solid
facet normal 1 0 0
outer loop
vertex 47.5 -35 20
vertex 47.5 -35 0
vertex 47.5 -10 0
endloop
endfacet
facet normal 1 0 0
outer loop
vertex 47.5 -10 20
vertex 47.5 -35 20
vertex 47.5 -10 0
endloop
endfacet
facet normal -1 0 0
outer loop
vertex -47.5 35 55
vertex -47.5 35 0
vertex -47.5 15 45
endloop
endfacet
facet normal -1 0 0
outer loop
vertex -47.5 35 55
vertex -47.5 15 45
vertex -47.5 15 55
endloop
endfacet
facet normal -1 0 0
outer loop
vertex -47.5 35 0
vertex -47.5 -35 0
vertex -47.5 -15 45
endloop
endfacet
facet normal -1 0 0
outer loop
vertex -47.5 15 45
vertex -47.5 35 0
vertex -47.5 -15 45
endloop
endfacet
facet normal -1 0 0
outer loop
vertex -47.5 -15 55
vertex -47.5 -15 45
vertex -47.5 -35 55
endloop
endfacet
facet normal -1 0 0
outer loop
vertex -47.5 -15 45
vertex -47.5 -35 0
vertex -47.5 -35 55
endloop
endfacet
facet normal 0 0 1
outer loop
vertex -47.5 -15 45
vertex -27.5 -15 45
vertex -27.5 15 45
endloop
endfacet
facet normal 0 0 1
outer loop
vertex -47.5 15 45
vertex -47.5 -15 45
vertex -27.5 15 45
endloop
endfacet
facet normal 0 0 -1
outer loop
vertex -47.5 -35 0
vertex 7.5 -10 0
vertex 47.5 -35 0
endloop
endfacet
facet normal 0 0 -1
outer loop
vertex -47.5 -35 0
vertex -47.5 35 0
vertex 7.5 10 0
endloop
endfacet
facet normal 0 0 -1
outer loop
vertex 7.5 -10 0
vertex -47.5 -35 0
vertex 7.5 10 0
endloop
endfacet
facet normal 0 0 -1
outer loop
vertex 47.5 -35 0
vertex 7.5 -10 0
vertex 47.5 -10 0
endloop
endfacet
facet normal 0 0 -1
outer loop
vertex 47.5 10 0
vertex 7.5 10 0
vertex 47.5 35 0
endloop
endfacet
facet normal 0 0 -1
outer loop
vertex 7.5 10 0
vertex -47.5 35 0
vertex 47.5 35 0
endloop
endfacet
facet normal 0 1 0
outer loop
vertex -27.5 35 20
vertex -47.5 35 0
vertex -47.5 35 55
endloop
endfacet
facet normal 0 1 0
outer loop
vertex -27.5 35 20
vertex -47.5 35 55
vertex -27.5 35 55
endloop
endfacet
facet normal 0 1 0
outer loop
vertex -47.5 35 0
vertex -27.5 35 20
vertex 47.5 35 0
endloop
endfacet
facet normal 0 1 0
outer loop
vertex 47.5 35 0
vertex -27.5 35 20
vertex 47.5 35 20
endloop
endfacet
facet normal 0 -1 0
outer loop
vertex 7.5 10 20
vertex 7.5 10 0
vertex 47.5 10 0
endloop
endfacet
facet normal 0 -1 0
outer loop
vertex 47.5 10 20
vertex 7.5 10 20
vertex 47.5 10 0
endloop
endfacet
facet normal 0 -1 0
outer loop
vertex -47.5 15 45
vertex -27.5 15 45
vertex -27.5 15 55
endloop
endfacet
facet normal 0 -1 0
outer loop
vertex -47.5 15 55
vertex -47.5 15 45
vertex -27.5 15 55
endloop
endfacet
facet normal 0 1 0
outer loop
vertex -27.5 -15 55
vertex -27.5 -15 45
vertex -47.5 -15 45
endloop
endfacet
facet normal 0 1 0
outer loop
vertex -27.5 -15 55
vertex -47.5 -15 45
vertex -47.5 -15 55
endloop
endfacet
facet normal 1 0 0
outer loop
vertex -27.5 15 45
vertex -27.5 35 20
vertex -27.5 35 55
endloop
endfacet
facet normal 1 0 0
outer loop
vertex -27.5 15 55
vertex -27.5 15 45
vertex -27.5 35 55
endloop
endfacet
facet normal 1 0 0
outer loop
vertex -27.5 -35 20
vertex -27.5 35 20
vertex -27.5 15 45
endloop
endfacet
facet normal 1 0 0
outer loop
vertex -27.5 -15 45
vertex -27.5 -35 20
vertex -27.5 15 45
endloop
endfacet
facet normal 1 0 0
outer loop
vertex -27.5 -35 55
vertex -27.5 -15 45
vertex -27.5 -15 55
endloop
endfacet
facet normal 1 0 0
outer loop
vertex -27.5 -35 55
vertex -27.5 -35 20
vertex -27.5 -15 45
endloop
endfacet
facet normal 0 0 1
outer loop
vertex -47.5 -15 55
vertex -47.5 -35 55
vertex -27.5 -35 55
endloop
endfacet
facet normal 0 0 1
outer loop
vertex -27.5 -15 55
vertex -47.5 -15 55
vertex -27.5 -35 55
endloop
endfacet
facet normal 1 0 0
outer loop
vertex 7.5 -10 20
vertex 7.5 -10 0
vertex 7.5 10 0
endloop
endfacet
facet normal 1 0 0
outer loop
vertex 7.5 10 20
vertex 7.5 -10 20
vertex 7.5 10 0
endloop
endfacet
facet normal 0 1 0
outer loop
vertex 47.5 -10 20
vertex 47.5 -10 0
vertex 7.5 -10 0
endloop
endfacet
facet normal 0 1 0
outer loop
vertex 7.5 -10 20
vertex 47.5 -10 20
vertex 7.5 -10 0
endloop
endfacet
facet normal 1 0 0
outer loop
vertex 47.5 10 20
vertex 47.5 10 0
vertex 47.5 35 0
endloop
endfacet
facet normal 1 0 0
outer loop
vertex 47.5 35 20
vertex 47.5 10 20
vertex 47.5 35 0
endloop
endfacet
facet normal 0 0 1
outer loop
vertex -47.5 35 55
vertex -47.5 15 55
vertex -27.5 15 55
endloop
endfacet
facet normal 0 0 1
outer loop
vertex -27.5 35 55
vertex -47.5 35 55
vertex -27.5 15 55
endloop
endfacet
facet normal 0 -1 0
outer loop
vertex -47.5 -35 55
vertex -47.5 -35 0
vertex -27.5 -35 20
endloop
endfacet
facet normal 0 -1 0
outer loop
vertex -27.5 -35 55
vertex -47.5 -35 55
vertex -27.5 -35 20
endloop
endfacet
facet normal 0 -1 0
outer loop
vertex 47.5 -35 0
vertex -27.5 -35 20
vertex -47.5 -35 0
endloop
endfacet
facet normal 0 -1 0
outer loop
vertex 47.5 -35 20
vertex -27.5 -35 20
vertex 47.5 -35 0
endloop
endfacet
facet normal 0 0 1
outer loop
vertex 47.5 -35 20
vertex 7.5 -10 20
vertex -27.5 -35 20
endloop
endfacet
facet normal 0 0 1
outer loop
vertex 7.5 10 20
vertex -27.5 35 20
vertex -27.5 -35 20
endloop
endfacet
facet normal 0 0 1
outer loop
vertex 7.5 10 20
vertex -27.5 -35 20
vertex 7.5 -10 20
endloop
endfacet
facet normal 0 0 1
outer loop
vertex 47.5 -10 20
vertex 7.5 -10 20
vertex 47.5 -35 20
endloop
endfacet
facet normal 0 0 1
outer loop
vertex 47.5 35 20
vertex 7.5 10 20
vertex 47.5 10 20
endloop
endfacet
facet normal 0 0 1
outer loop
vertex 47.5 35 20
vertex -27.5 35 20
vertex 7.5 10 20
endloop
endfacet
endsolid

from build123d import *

# Parameters (mm, degrees)
F1_DEPTH = 20
F2_W     = 20
F2_H     = 35
F3_DEPTH = 70
F4_W     = 30
F4_H     = 10
F5_DEPTH = 20.001


with BuildPart() as f1:
    # F0 (on Top) → F1 (new body)
    with BuildSketch(Plane.XY):
        Polygon((-47.5, -35), (47.5, -35), (47.5, -10), (7.5, -10), (7.5, 0), (7.5, 10), (47.5, 10), (47.5, 35), (-47.5, 35), align=None)
    extrude(amount=F1_DEPTH)

    # F2 (on face) → F3 (join)
    with BuildSketch(Plane.XZ.offset(35)):
        with Locations((-37.5, 37.5)):
            Rectangle(F2_W, F2_H)
    extrude(amount=-F3_DEPTH)

    # F4 (on face) → F5 (cut, through all)
    with BuildSketch(Plane.YZ.offset(-27.5)):
        with Locations((0, 50)):
            Rectangle(F4_W, F4_H)
    extrude(amount=-F5_DEPTH, mode=Mode.SUBTRACT)


solid = f1.part
